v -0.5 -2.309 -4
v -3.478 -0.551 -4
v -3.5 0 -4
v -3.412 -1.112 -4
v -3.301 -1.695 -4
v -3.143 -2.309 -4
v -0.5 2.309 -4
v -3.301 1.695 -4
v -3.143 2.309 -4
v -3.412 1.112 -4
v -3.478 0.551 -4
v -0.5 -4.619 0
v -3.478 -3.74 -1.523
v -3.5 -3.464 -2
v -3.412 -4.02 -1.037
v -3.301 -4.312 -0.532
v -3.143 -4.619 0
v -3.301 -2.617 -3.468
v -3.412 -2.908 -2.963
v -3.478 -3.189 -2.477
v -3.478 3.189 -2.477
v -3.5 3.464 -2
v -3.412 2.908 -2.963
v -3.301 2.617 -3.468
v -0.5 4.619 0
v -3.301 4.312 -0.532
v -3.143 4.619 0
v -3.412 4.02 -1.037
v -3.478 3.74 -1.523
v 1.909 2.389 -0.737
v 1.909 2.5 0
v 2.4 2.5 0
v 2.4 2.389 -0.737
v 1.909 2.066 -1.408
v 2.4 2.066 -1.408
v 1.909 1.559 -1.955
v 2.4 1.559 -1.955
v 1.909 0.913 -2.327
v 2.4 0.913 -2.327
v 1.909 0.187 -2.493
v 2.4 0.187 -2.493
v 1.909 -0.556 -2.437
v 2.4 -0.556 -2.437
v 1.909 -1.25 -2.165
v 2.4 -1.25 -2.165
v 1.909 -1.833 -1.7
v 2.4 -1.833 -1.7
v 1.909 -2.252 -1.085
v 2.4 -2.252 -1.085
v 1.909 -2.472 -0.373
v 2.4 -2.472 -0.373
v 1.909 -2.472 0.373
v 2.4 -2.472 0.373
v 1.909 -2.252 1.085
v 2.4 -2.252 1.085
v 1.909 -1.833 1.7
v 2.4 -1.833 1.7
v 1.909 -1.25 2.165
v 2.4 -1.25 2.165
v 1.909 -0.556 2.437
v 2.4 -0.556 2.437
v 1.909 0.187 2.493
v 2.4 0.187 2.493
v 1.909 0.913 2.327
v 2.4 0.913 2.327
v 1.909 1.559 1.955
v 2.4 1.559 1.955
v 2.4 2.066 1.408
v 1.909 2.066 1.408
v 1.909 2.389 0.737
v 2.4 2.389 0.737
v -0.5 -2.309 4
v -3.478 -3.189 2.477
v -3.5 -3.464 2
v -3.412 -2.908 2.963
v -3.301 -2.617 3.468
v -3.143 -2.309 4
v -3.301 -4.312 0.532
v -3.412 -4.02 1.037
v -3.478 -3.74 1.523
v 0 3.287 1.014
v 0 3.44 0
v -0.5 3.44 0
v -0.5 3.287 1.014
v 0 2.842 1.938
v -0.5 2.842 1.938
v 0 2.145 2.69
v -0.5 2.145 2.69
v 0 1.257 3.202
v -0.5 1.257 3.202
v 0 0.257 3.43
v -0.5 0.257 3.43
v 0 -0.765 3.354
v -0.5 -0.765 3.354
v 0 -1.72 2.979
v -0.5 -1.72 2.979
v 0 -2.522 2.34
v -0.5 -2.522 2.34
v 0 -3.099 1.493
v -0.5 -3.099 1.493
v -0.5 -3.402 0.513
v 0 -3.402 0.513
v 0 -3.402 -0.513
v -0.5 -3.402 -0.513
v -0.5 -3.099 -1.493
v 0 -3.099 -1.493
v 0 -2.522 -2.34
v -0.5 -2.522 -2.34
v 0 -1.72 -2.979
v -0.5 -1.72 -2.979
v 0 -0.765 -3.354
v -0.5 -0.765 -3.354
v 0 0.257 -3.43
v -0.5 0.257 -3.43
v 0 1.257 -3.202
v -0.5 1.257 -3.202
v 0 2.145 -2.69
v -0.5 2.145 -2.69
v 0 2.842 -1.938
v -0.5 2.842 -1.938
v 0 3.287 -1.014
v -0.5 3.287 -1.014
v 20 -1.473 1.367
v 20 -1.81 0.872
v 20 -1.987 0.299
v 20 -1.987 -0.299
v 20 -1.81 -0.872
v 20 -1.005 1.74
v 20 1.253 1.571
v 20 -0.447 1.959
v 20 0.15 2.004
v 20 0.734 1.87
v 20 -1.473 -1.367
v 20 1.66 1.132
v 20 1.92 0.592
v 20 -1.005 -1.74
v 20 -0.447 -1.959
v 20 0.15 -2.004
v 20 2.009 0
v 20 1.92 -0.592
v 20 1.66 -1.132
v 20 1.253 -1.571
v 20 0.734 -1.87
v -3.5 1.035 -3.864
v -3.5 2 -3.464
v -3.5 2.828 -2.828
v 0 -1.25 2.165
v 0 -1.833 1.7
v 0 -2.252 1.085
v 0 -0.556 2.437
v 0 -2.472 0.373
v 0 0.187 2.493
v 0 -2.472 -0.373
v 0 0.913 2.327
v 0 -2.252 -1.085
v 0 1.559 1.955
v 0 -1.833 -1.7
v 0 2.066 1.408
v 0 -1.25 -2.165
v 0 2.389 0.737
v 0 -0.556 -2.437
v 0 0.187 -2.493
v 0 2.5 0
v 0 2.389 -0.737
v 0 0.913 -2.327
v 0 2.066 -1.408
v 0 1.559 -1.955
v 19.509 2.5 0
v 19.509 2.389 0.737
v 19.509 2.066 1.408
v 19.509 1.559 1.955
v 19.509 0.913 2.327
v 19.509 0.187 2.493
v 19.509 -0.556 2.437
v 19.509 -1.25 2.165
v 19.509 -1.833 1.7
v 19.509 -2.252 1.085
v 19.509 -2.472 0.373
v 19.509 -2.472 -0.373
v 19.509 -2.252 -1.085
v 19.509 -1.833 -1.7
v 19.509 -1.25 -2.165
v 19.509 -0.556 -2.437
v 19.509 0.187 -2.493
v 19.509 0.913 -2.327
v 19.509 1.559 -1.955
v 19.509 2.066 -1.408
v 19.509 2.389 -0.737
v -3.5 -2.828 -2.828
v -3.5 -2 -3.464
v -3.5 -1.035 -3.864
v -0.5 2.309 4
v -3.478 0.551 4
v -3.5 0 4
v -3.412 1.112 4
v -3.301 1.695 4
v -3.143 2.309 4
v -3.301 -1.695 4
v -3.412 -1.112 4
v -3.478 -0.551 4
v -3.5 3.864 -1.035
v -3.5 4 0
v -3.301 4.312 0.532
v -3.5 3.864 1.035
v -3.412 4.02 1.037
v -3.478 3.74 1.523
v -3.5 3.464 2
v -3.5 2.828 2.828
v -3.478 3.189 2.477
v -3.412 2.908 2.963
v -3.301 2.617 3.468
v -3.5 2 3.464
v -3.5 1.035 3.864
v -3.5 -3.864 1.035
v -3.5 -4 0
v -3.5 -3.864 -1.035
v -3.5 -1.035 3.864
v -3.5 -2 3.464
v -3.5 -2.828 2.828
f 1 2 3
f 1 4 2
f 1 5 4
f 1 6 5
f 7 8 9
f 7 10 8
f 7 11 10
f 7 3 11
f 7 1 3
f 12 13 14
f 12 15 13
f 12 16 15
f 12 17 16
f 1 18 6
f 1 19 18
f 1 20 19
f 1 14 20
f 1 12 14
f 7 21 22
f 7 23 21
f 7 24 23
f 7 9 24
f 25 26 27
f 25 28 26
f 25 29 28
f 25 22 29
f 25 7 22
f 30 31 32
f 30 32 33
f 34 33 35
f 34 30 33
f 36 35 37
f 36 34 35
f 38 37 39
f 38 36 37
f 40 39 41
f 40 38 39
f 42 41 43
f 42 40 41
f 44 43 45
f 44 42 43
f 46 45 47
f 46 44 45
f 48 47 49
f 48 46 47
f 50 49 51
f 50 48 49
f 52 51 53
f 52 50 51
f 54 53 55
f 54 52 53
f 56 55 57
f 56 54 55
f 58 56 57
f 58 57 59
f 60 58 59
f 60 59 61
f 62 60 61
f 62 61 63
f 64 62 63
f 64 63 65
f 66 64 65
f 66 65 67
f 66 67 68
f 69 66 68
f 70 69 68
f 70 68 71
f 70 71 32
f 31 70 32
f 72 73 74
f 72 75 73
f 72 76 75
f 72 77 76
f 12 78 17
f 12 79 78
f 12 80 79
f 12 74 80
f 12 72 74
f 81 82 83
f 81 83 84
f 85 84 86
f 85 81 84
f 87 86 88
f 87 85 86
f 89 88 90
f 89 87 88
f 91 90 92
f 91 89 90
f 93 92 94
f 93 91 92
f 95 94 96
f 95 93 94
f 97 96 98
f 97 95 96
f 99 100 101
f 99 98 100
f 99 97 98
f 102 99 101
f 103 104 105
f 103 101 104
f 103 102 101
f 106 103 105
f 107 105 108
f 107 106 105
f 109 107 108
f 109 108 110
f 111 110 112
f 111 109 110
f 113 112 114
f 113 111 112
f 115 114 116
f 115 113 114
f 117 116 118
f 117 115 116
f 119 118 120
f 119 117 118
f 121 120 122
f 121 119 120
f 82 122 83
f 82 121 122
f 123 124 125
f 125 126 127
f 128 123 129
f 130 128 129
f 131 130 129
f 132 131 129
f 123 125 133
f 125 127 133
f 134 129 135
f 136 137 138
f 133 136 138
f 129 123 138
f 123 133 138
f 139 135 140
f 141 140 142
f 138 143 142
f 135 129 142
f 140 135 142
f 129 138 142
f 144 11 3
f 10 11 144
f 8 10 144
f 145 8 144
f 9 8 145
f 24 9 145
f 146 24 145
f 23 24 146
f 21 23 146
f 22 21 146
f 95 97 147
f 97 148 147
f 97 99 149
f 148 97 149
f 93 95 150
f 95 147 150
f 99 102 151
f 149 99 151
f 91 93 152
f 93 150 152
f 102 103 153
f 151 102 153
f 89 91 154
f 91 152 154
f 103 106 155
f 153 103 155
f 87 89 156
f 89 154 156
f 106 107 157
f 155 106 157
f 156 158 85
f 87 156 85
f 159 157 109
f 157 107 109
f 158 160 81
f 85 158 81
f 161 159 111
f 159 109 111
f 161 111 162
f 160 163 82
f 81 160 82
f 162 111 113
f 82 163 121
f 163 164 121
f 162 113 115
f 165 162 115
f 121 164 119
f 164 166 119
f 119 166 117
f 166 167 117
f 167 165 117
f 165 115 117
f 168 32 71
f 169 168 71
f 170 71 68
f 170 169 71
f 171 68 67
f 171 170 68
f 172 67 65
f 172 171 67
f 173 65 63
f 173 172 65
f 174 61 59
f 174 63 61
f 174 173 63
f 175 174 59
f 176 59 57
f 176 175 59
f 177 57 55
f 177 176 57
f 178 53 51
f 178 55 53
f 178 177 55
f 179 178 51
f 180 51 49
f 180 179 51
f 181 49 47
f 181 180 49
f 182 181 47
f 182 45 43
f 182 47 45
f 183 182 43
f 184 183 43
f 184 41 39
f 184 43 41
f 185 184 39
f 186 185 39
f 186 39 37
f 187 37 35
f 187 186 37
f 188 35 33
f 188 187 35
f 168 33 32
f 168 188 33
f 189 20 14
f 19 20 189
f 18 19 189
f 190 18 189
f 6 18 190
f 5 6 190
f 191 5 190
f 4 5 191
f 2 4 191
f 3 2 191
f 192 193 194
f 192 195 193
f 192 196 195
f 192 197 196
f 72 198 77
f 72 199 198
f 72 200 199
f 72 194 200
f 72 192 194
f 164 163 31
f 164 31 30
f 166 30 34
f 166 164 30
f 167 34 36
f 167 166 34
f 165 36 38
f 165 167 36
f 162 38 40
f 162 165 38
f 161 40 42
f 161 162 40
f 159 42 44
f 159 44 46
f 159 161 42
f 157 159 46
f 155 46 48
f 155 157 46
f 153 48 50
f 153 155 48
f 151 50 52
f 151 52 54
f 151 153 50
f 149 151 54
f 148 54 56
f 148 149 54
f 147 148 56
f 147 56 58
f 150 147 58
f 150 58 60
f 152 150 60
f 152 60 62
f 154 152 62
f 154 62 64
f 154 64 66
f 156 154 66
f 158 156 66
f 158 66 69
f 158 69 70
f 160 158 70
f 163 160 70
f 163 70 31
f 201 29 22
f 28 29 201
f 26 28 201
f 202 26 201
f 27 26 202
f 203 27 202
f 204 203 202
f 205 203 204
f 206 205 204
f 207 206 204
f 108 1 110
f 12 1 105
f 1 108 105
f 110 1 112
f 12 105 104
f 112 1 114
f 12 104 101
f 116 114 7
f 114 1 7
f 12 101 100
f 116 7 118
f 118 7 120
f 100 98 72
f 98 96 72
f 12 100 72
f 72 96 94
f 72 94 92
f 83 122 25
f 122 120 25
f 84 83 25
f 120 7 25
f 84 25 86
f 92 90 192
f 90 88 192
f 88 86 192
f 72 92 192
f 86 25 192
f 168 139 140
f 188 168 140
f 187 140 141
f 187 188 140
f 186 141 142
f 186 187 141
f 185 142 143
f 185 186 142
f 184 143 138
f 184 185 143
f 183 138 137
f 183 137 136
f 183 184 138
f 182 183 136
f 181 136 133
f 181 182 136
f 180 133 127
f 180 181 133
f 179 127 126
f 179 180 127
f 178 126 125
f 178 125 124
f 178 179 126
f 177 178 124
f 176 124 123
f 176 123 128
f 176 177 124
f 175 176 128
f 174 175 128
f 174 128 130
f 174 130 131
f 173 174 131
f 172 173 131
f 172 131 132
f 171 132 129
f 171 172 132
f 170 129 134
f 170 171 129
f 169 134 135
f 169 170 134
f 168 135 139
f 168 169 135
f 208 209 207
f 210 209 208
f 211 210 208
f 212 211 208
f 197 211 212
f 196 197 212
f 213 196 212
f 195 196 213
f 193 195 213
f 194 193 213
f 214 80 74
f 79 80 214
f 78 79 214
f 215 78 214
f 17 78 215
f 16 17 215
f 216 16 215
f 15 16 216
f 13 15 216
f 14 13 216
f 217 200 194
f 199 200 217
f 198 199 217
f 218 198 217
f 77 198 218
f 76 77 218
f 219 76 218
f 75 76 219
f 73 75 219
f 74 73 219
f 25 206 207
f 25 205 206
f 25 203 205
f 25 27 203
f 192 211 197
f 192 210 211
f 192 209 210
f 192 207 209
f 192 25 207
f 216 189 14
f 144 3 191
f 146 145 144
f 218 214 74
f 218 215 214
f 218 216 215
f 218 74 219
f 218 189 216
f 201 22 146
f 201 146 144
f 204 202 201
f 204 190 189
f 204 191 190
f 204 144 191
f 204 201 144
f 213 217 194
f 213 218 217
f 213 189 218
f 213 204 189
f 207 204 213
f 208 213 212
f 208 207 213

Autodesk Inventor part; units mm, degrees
ref_plane "YZ Plane" through (0, 0, 0) normal (1, 0, 0) x (0, 1, 0)
ref_plane "XZ Plane" through (0, 0, 0) normal (0, 1, 0) x (-1, 0, 0)
sketch "Sketch1" plane through (0, 0, 0) normal (0, 0, 1) x (1, 0, 0)
  line L0 (0, 3.44) -> (0, 2.5)
  line L1 (2.4, 2.5) -> (20, 2.5)
  line L2 (20, 2.5) -> (20, 0)
  line L3 (20, 0) -> (-0.5001, 0)
  line L4 (-4.6001, 0) -> (24.1, 0) projected
  line L5 (-0.5001, 0) -> (-0.5001, 3.44)
  line L6 (-0.5001, 3.44) -> (0, 3.44)
  line L7 (2.4, 2.5) -> (1.9091, 2.5)
  line L8 (1.9091, 2.5) -> (0, 2.5)
  line L9 (0, -0.688) -> (0, 4.128) projected
  dimension "d0" = 20
  dimension "d1" = 17.6
  dimension "d2" = 5
  dimension "d9" = 0.5001
  dimension "d10" = 6.88
  dimension "d13" = 0.4909
  dimension "d14" = 5
revolve "Body" add sketch "Sketch1" angle 360 about axis through (20, 0, 0) along (-1, 0, 0)
sketch "Sketch2" plane through (-0.5001, 0, 0) normal (-1, 0, 0) x (0, 0, 1)
  line L0 (0, 4.6188) -> (4, 2.3094)
  line L1 (4, 2.3094) -> (4, -2.3094)
  line L2 (4, -2.3094) -> (0, -4.6188)
  line L3 (0, -4.6188) -> (-4, -2.3094)
  line L4 (-4, -2.3094) -> (-4, 2.3094)
  line L5 (-4, 2.3094) -> (0, 4.6188)
  point P0 (0, 0)
  point P1 (0, 0)
  dimension "d11" = 8
extrude "Head" add sketch "Sketch2" along normal blind 3
sketch "Sketch4" plane through (0, 0, 0) normal (0, 0, 1) x (1, 0, 0)
  line L0 (-3.5001, 4) -> (-3.5001, 4.6188)
  line L1 (-3.5001, 4.6188) -> (-3.1428, 4.6188)
  line L2 (-3.1428, 4.6188) -> (-3.5001, 4)
  line L3 (-4.1001, 0) -> (0.0999, 0) projected
  line L4 (-0.5001, 4.6188) -> (-3.5001, 4.6188) projected
  line L5 (-3.5001, 2.3094) -> (-3.5001, 4.6188) projected
  dimension "d5" = 30
  dimension "d19" = 8
revolve "Chamfer1" cut sketch "Sketch4" angle 360 about axis through (-10, 0, 0) along (1, 0, 0)
thread "Thread" size "M5x0.8" class "6g" standard "ISO Metric profile" length 17.6
chamfer "Chamfer2" distance 0.4908 distance2 0.4909 1 edges at (20, -2.5, 0) measured on face at (20, 0.7379, -0.3873)
ref_plane "Work Plane1" through (1.525, 0, 0) normal (0, 0, 1) x (1, 0, 0)
equation "\"d0\" = NLG"
equation "\"d1\" = GEL"
equation "\"d2\" = GD"
equation "\"d10\" = SD2"
equation "\"d14\" = BDM"
equation "\"d11\" = SW"
equation "\"d3\" = KOH - SD"
equation "\"d5\" = ANG1"
equation "\"d19\" = SW0"
equation "\"d15\" = GEL"
equation "\"d6\" = -0.5 * SPD + 0.5 * GD"
equation "\"NLG\" = 20"
equation "\"GD\" = NND"
equation "\"BDM\" = NND"
equation "\"KOH\" = 3.5"
equation "\"GEL\" = 17.6"
equation "\"SW\" = 8"
equation "\"SW0\" = SW"
equation "\"SPD\" = NND - 1.2269 * PTC"
equation "\"SD2\" = 6.88"
equation "\"SD\" = 0.5"
equation "\"ANG1\" = 30deg"
equation "\"GAL\" = 0.61345 * PTC"
equation "\"GUL\" = 0.61345 * PTC"
equation "\"RR\" = 0.2"
equation "\"GD1\" = THREADDIA - 1.2269 * PTC"
equation "\"THREADDIA\" = 5"
equation "\"SDH\" = SD2"
equation "\"SDHG\" = 2.4"
equation "\"TOA\" = 30deg"
equation "\"PTC\" = 0.8"
equation "\"NND\" = 5"
equation "\"E0\" = 9.24"
properties part number "ISO 4017 - M5 x 20" material "Stainless Steel, 440C"
